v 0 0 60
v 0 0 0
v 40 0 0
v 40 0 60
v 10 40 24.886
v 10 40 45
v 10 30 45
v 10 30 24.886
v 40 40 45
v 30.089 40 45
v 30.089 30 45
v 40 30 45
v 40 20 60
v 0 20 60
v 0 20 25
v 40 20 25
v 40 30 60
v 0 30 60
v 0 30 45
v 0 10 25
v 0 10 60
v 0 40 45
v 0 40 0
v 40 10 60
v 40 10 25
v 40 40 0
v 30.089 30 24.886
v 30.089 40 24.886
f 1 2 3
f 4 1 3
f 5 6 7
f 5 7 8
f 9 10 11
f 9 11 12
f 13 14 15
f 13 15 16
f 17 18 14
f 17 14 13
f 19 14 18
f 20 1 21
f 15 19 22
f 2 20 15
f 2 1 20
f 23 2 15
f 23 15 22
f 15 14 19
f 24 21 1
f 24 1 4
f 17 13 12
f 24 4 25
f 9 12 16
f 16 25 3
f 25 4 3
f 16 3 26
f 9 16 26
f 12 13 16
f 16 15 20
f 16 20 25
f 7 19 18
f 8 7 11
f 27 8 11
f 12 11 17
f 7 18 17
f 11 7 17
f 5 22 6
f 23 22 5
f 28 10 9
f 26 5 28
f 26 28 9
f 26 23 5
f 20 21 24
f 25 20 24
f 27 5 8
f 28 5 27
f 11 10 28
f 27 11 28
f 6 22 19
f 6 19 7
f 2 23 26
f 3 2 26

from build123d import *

# Parameters (mm, degrees)
SKETCH1_W           = 40
SKETCH1_H           = 40
BOSS_EXTRUDE1_DEPTH = 60
SKETCH2_W           = 40
SKETCH2_H           = 10
CUT_EXTRUDE1_DEPTH  = 35
SKETCH3_W           = 40
SKETCH3_H           = 10
CUT_EXTRUDE2_DEPTH  = 15
SKETCH4_W           = 20.089198479
SKETCH4_H           = 20.114051596
CUT_EXTRUDE3_DEPTH  = 10


with BuildPart() as part:
    # Sketch1 → Boss-Extrude1 (new body)
    with BuildSketch(Plane.XY):
        with Locations((20, 20)):
            Rectangle(SKETCH1_W, SKETCH1_H)
    extrude(amount=BOSS_EXTRUDE1_DEPTH)

    # Sketch2 → Cut-Extrude1 (cut)
    with BuildSketch(Plane.XY.offset(60)):
        with Locations((20, 15)):
            Rectangle(SKETCH2_W, SKETCH2_H)
    extrude(amount=-CUT_EXTRUDE1_DEPTH, mode=Mode.SUBTRACT)

    # Sketch3 → Cut-Extrude2 (cut)
    with BuildSketch(Plane.XY.offset(60)):
        with Locations((20, 35)):
            Rectangle(SKETCH3_W, SKETCH3_H)
    extrude(amount=-CUT_EXTRUDE2_DEPTH, mode=Mode.SUBTRACT)

    # Sketch4 → Cut-Extrude3 (cut)
    with BuildSketch(Plane(origin=(0, 40, 0), x_dir=(1, 0, 0), z_dir=(0, 1, 0))):
        with Locations((20.04459924, -34.942974202)):
            Rectangle(SKETCH4_W, SKETCH4_H)
    extrude(amount=-CUT_EXTRUDE3_DEPTH, mode=Mode.SUBTRACT)


solid = part.part
